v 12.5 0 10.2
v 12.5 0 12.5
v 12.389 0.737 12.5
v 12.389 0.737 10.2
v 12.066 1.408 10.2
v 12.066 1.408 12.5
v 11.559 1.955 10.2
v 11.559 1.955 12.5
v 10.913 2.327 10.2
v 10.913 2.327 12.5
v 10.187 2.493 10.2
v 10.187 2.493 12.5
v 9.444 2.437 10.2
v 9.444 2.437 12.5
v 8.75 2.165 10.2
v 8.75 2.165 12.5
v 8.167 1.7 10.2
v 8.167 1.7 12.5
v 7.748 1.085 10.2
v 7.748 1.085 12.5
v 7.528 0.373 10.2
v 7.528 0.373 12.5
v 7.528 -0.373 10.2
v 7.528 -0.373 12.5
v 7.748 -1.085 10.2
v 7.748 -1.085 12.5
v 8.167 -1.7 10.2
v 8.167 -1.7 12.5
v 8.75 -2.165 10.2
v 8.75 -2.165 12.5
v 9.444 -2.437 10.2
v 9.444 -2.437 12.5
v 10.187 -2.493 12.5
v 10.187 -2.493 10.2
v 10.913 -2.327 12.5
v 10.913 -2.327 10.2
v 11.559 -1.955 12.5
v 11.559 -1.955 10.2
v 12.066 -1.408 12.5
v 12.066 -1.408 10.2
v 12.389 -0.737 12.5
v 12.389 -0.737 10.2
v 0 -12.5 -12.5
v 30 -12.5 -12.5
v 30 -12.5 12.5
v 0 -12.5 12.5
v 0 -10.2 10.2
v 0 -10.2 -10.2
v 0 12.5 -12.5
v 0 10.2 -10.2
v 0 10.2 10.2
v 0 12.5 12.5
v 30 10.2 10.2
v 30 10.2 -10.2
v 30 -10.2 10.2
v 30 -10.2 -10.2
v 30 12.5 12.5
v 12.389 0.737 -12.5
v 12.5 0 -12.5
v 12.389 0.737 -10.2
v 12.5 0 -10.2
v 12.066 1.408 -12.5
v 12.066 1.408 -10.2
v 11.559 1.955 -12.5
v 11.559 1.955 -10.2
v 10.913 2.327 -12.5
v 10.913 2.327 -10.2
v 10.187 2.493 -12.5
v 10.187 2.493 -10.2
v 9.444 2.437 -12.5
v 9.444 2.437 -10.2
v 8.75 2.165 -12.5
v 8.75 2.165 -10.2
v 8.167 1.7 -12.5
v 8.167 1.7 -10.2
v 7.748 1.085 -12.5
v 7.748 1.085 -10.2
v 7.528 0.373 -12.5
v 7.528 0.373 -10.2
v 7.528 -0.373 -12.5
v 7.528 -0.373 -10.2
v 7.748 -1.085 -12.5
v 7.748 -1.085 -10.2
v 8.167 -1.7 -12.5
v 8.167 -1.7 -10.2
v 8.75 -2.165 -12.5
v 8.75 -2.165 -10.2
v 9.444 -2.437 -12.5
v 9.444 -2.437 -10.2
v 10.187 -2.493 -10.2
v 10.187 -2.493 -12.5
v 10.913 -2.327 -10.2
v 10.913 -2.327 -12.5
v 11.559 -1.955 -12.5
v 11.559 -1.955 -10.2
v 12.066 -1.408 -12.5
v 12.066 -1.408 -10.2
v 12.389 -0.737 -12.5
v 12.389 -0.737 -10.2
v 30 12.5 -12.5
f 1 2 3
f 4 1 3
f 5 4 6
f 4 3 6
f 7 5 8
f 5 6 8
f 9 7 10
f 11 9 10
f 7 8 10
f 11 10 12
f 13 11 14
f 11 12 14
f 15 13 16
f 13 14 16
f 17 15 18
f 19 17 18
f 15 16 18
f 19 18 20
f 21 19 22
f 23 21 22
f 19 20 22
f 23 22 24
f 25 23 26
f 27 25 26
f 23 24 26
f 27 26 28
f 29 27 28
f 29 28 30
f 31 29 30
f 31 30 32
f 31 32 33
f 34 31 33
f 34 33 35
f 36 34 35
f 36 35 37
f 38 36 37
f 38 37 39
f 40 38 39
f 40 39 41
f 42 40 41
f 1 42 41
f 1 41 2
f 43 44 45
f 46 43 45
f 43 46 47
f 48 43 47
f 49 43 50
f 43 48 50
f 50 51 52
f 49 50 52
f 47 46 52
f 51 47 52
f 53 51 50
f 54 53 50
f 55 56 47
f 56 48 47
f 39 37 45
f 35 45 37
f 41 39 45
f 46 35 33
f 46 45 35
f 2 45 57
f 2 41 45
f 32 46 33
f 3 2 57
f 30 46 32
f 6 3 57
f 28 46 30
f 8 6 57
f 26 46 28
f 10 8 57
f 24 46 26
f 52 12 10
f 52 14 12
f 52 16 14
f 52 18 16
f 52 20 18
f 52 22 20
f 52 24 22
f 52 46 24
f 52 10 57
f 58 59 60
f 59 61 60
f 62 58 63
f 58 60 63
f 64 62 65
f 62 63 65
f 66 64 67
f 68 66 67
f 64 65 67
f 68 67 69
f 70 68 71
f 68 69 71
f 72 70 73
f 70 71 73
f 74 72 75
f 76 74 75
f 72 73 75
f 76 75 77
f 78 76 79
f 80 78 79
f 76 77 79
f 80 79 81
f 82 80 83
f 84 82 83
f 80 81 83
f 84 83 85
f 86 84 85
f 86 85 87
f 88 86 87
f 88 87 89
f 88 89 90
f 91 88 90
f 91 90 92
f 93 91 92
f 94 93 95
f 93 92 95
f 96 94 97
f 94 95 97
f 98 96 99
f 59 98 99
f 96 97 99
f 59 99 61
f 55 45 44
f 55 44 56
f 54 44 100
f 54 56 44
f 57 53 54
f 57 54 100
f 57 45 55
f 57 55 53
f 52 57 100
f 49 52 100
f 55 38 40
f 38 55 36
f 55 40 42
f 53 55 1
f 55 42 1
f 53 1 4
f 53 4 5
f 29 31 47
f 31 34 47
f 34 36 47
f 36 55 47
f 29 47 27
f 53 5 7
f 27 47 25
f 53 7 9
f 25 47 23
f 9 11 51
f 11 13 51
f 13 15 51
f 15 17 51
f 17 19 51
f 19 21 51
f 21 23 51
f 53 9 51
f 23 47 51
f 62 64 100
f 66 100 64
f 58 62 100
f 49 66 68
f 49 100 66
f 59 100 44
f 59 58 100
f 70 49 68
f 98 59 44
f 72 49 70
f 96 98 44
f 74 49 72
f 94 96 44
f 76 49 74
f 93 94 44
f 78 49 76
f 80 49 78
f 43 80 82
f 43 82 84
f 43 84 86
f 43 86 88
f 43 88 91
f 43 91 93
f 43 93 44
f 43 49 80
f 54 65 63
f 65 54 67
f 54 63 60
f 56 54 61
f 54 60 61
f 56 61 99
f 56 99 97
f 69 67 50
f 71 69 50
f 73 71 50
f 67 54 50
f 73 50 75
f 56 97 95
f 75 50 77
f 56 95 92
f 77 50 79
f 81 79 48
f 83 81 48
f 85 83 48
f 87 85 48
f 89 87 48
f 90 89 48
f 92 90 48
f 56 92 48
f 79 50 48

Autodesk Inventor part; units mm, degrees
ref_plane "YZ Plane" through (0, 0, 0) normal (1, 0, 0) x (0, 1, 0)
ref_plane "XZ Plane" through (0, 0, 0) normal (0, 1, 0) x (-1, 0, 0)
ref_plane "XY Plane" through (0, 0, 0) normal (0, 0, 1) x (1, 0, 0)
sketch "スケッチ1" plane through (0, 0, 0) normal (1, 0, 0) x (0, 1, 0)
  line L0 (-12.5, 12.5) -> (12.5, 12.5)
  line L1 (12.5, 12.5) -> (12.5, -12.5)
  line L2 (12.5, -12.5) -> (-12.5, -12.5)
  line L3 (-12.5, -12.5) -> (-12.5, 12.5)
  line L4 (-12.5, 12.5) -> (12.5, -12.5) construction
  line L5 (12.5, 12.5) -> (-12.5, -12.5) construction
  line L6 (-10.2, 10.2) -> (10.2, 10.2)
  line L7 (10.2, 10.2) -> (10.2, -10.2)
  line L8 (10.2, -10.2) -> (-10.2, -10.2)
  line L9 (-10.2, -10.2) -> (-10.2, 10.2)
  line L10 (-10.2, 10.2) -> (10.2, -10.2) construction
  line L11 (10.2, 10.2) -> (-10.2, -10.2) construction
  point P0 (0, 0)
  dimension "d0" = 25
  dimension "d1" = 25
  dimension "d2" = 2.3
extrude "押し出し1" add sketch "スケッチ1" along normal blind 30
sketch "スケッチ2" plane through (0, -12.5, 12.5) normal (0, 0, 1) x (1, 0, 0)
  circle A0 centre (10, 12.5) radius 2.5
  line L0 (0, 0) -> (0, 25) projected
  line L1 (0, 0) -> (30, 0) projected
  point P0 (0, 12.5)
  dimension "d5" = 5
  dimension "d6" = 10
  dimension "d7" = 12.5
extrude "押し出し2" cut sketch "スケッチ2" against normal through all
properties part number "bracket1(body)" material "鉄、可鍛鉄"
